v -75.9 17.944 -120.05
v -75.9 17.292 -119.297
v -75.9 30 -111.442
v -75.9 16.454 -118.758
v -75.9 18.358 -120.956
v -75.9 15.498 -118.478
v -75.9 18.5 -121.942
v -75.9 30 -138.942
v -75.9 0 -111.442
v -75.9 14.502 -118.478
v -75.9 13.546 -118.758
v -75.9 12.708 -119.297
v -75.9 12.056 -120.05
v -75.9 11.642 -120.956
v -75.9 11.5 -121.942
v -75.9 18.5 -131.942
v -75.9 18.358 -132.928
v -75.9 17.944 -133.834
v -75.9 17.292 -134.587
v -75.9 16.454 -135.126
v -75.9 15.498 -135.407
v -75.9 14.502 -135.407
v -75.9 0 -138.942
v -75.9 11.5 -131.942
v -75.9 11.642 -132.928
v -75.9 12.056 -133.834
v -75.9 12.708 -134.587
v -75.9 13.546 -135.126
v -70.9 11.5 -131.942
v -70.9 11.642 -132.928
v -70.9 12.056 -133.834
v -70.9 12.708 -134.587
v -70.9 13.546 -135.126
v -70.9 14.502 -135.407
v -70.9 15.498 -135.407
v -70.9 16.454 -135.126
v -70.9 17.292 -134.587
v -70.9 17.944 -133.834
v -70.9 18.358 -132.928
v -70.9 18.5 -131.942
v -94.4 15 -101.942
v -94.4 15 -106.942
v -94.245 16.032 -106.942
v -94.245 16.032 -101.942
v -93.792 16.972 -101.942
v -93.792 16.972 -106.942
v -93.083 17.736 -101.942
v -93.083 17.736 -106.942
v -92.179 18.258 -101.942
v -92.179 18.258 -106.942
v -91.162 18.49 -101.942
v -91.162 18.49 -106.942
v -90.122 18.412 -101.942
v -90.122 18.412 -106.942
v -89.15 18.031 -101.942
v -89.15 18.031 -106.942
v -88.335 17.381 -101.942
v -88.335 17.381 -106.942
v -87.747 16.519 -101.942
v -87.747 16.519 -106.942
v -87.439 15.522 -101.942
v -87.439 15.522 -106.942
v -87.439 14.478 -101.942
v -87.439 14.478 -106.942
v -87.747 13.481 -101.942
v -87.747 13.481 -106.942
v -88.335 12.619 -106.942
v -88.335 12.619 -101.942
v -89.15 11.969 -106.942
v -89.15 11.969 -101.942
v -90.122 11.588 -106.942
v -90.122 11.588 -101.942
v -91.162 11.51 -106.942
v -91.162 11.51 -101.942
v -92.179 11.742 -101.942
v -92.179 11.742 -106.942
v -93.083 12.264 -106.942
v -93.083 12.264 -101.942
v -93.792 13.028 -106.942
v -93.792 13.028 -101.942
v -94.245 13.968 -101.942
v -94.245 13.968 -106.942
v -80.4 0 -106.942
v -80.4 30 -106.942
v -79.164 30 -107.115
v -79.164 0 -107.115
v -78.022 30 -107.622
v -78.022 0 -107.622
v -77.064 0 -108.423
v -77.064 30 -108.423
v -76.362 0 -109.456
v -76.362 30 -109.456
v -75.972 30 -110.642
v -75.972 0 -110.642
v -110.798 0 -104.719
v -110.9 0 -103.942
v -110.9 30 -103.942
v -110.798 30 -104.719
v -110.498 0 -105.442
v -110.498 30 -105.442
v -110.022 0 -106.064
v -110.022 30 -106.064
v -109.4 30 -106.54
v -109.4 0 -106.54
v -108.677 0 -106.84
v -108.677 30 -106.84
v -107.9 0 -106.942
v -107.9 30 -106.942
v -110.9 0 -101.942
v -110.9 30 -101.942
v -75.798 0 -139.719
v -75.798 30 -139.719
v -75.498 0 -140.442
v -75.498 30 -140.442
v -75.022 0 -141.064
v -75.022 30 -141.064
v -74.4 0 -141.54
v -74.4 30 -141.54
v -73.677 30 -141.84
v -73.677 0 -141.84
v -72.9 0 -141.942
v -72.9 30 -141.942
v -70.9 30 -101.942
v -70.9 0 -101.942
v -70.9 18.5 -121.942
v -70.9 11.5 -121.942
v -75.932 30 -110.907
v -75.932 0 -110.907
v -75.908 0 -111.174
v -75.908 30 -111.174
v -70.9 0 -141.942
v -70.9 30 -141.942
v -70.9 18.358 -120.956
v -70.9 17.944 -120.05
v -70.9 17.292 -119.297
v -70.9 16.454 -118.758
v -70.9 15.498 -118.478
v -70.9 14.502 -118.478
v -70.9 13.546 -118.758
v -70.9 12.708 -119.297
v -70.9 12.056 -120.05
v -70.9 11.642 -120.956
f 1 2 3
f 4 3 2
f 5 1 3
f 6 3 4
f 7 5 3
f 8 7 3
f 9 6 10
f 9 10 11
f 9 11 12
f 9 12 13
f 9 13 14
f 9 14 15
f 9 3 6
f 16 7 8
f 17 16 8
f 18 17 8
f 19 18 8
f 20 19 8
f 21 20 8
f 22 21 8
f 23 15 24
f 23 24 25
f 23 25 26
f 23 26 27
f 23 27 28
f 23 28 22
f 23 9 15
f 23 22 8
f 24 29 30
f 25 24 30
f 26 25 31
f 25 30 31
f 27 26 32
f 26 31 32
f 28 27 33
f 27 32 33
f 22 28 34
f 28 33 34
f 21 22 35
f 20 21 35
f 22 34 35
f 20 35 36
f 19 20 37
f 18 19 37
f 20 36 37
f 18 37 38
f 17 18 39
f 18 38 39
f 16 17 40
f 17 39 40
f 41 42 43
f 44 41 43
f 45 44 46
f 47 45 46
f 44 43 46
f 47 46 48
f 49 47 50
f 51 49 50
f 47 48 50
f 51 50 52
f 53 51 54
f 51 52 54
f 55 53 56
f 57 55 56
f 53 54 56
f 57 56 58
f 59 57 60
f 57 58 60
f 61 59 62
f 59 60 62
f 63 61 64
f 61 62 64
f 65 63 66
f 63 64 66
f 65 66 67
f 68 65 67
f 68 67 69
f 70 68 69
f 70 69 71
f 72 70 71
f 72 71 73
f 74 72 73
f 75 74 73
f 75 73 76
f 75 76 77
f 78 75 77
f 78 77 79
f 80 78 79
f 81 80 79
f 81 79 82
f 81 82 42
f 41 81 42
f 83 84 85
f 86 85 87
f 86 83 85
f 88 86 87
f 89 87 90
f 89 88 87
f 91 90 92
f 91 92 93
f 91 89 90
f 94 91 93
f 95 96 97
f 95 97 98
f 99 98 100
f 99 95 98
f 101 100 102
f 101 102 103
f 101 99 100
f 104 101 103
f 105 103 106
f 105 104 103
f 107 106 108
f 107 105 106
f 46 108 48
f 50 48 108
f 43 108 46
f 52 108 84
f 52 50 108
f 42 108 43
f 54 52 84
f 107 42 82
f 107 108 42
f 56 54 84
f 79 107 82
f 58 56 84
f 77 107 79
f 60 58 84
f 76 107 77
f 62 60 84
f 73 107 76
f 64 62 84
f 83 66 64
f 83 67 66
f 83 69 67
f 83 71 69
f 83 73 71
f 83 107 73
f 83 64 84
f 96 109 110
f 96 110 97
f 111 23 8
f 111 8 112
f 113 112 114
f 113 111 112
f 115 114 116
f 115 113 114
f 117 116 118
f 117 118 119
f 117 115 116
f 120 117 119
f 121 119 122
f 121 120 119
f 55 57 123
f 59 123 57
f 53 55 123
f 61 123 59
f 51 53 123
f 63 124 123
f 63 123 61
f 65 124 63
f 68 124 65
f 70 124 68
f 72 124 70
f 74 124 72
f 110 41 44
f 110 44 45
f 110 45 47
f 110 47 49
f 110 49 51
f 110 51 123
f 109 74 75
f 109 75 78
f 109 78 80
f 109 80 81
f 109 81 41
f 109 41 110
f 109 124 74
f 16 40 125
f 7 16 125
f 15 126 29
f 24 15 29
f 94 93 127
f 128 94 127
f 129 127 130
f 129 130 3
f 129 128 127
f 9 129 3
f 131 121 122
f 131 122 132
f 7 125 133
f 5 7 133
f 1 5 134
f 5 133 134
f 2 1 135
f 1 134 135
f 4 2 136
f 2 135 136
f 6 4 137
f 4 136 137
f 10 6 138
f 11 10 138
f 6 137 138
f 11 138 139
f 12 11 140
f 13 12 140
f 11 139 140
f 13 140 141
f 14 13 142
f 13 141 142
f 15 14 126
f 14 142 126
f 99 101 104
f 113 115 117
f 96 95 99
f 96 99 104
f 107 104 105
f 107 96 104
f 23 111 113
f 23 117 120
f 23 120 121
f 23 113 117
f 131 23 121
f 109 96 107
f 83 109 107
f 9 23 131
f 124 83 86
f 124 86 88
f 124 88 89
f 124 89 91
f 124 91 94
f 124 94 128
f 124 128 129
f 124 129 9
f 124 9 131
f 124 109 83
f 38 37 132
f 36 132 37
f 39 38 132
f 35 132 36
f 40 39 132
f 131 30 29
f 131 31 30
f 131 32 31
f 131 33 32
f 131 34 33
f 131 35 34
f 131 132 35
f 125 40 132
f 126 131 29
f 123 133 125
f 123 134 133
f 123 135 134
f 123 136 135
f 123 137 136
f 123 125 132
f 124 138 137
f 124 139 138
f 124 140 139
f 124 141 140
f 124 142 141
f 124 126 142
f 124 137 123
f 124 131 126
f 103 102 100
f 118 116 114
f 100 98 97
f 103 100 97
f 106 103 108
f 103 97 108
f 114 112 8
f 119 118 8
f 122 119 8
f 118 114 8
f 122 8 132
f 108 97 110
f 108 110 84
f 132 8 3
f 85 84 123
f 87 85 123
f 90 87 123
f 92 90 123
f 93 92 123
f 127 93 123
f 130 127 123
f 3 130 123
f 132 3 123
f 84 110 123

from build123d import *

# Parameters (mm, degrees)
F1_DEPTH = 30
F3_D     = 7
F5_DEPTH = 25


with BuildPart() as f1:
    # F0 (on Front) → F1 (new body)
    with BuildSketch(Plane.XZ):
        with BuildLine():
            ThreePointArc((-80.400344, -106.942194), (-77.515036, -107.988935), (-75.972026, -110.642194))
            ThreePointArc((-75.972026, -110.642194), (-75.9183, -111.040591), (-75.900344, -111.442194))
            Line((-75.900344, -111.442194), (-75.900344, -138.942194))
            ThreePointArc((-75.900344, -138.942194), (-75.021664, -141.063514), (-72.900344, -141.942194))
            Line((-72.900344, -141.942194), (-70.900344, -141.942194))
            Line((-70.900344, -141.942194), (-70.900344, -101.942194))
            Line((-70.900344, -101.942194), (-110.900344, -101.942194))
            Line((-110.900344, -101.942194), (-110.900344, -103.942194))
            ThreePointArc((-110.900344, -103.942194), (-110.021664, -106.063514), (-107.900344, -106.942194))
            Line((-107.900344, -106.942194), (-80.400344, -106.942194))
        make_face()
    extrude(amount=-F1_DEPTH)

    # F3 (through all)
    with Locations(Plane.XY.offset(-101.942194)):
        with Locations((-90.900344, 15)):
            Hole(F3_D / 2)

    # F4 (on face) → F5 (cut)
    with BuildSketch(Plane.YZ.offset(-70.900344)):
        with BuildLine():
            ThreePointArc((11.5, -131.942194), (15, -135.442194), (18.5, -131.942194))
            Line((18.5, -131.942194), (18.5, -121.942194))
            ThreePointArc((18.5, -121.942194), (15, -118.442194), (11.5, -121.942194))
            Line((11.5, -121.942194), (11.5, -131.942194))
        make_face()
    extrude(amount=-F5_DEPTH, mode=Mode.SUBTRACT)


solid = f1.part
